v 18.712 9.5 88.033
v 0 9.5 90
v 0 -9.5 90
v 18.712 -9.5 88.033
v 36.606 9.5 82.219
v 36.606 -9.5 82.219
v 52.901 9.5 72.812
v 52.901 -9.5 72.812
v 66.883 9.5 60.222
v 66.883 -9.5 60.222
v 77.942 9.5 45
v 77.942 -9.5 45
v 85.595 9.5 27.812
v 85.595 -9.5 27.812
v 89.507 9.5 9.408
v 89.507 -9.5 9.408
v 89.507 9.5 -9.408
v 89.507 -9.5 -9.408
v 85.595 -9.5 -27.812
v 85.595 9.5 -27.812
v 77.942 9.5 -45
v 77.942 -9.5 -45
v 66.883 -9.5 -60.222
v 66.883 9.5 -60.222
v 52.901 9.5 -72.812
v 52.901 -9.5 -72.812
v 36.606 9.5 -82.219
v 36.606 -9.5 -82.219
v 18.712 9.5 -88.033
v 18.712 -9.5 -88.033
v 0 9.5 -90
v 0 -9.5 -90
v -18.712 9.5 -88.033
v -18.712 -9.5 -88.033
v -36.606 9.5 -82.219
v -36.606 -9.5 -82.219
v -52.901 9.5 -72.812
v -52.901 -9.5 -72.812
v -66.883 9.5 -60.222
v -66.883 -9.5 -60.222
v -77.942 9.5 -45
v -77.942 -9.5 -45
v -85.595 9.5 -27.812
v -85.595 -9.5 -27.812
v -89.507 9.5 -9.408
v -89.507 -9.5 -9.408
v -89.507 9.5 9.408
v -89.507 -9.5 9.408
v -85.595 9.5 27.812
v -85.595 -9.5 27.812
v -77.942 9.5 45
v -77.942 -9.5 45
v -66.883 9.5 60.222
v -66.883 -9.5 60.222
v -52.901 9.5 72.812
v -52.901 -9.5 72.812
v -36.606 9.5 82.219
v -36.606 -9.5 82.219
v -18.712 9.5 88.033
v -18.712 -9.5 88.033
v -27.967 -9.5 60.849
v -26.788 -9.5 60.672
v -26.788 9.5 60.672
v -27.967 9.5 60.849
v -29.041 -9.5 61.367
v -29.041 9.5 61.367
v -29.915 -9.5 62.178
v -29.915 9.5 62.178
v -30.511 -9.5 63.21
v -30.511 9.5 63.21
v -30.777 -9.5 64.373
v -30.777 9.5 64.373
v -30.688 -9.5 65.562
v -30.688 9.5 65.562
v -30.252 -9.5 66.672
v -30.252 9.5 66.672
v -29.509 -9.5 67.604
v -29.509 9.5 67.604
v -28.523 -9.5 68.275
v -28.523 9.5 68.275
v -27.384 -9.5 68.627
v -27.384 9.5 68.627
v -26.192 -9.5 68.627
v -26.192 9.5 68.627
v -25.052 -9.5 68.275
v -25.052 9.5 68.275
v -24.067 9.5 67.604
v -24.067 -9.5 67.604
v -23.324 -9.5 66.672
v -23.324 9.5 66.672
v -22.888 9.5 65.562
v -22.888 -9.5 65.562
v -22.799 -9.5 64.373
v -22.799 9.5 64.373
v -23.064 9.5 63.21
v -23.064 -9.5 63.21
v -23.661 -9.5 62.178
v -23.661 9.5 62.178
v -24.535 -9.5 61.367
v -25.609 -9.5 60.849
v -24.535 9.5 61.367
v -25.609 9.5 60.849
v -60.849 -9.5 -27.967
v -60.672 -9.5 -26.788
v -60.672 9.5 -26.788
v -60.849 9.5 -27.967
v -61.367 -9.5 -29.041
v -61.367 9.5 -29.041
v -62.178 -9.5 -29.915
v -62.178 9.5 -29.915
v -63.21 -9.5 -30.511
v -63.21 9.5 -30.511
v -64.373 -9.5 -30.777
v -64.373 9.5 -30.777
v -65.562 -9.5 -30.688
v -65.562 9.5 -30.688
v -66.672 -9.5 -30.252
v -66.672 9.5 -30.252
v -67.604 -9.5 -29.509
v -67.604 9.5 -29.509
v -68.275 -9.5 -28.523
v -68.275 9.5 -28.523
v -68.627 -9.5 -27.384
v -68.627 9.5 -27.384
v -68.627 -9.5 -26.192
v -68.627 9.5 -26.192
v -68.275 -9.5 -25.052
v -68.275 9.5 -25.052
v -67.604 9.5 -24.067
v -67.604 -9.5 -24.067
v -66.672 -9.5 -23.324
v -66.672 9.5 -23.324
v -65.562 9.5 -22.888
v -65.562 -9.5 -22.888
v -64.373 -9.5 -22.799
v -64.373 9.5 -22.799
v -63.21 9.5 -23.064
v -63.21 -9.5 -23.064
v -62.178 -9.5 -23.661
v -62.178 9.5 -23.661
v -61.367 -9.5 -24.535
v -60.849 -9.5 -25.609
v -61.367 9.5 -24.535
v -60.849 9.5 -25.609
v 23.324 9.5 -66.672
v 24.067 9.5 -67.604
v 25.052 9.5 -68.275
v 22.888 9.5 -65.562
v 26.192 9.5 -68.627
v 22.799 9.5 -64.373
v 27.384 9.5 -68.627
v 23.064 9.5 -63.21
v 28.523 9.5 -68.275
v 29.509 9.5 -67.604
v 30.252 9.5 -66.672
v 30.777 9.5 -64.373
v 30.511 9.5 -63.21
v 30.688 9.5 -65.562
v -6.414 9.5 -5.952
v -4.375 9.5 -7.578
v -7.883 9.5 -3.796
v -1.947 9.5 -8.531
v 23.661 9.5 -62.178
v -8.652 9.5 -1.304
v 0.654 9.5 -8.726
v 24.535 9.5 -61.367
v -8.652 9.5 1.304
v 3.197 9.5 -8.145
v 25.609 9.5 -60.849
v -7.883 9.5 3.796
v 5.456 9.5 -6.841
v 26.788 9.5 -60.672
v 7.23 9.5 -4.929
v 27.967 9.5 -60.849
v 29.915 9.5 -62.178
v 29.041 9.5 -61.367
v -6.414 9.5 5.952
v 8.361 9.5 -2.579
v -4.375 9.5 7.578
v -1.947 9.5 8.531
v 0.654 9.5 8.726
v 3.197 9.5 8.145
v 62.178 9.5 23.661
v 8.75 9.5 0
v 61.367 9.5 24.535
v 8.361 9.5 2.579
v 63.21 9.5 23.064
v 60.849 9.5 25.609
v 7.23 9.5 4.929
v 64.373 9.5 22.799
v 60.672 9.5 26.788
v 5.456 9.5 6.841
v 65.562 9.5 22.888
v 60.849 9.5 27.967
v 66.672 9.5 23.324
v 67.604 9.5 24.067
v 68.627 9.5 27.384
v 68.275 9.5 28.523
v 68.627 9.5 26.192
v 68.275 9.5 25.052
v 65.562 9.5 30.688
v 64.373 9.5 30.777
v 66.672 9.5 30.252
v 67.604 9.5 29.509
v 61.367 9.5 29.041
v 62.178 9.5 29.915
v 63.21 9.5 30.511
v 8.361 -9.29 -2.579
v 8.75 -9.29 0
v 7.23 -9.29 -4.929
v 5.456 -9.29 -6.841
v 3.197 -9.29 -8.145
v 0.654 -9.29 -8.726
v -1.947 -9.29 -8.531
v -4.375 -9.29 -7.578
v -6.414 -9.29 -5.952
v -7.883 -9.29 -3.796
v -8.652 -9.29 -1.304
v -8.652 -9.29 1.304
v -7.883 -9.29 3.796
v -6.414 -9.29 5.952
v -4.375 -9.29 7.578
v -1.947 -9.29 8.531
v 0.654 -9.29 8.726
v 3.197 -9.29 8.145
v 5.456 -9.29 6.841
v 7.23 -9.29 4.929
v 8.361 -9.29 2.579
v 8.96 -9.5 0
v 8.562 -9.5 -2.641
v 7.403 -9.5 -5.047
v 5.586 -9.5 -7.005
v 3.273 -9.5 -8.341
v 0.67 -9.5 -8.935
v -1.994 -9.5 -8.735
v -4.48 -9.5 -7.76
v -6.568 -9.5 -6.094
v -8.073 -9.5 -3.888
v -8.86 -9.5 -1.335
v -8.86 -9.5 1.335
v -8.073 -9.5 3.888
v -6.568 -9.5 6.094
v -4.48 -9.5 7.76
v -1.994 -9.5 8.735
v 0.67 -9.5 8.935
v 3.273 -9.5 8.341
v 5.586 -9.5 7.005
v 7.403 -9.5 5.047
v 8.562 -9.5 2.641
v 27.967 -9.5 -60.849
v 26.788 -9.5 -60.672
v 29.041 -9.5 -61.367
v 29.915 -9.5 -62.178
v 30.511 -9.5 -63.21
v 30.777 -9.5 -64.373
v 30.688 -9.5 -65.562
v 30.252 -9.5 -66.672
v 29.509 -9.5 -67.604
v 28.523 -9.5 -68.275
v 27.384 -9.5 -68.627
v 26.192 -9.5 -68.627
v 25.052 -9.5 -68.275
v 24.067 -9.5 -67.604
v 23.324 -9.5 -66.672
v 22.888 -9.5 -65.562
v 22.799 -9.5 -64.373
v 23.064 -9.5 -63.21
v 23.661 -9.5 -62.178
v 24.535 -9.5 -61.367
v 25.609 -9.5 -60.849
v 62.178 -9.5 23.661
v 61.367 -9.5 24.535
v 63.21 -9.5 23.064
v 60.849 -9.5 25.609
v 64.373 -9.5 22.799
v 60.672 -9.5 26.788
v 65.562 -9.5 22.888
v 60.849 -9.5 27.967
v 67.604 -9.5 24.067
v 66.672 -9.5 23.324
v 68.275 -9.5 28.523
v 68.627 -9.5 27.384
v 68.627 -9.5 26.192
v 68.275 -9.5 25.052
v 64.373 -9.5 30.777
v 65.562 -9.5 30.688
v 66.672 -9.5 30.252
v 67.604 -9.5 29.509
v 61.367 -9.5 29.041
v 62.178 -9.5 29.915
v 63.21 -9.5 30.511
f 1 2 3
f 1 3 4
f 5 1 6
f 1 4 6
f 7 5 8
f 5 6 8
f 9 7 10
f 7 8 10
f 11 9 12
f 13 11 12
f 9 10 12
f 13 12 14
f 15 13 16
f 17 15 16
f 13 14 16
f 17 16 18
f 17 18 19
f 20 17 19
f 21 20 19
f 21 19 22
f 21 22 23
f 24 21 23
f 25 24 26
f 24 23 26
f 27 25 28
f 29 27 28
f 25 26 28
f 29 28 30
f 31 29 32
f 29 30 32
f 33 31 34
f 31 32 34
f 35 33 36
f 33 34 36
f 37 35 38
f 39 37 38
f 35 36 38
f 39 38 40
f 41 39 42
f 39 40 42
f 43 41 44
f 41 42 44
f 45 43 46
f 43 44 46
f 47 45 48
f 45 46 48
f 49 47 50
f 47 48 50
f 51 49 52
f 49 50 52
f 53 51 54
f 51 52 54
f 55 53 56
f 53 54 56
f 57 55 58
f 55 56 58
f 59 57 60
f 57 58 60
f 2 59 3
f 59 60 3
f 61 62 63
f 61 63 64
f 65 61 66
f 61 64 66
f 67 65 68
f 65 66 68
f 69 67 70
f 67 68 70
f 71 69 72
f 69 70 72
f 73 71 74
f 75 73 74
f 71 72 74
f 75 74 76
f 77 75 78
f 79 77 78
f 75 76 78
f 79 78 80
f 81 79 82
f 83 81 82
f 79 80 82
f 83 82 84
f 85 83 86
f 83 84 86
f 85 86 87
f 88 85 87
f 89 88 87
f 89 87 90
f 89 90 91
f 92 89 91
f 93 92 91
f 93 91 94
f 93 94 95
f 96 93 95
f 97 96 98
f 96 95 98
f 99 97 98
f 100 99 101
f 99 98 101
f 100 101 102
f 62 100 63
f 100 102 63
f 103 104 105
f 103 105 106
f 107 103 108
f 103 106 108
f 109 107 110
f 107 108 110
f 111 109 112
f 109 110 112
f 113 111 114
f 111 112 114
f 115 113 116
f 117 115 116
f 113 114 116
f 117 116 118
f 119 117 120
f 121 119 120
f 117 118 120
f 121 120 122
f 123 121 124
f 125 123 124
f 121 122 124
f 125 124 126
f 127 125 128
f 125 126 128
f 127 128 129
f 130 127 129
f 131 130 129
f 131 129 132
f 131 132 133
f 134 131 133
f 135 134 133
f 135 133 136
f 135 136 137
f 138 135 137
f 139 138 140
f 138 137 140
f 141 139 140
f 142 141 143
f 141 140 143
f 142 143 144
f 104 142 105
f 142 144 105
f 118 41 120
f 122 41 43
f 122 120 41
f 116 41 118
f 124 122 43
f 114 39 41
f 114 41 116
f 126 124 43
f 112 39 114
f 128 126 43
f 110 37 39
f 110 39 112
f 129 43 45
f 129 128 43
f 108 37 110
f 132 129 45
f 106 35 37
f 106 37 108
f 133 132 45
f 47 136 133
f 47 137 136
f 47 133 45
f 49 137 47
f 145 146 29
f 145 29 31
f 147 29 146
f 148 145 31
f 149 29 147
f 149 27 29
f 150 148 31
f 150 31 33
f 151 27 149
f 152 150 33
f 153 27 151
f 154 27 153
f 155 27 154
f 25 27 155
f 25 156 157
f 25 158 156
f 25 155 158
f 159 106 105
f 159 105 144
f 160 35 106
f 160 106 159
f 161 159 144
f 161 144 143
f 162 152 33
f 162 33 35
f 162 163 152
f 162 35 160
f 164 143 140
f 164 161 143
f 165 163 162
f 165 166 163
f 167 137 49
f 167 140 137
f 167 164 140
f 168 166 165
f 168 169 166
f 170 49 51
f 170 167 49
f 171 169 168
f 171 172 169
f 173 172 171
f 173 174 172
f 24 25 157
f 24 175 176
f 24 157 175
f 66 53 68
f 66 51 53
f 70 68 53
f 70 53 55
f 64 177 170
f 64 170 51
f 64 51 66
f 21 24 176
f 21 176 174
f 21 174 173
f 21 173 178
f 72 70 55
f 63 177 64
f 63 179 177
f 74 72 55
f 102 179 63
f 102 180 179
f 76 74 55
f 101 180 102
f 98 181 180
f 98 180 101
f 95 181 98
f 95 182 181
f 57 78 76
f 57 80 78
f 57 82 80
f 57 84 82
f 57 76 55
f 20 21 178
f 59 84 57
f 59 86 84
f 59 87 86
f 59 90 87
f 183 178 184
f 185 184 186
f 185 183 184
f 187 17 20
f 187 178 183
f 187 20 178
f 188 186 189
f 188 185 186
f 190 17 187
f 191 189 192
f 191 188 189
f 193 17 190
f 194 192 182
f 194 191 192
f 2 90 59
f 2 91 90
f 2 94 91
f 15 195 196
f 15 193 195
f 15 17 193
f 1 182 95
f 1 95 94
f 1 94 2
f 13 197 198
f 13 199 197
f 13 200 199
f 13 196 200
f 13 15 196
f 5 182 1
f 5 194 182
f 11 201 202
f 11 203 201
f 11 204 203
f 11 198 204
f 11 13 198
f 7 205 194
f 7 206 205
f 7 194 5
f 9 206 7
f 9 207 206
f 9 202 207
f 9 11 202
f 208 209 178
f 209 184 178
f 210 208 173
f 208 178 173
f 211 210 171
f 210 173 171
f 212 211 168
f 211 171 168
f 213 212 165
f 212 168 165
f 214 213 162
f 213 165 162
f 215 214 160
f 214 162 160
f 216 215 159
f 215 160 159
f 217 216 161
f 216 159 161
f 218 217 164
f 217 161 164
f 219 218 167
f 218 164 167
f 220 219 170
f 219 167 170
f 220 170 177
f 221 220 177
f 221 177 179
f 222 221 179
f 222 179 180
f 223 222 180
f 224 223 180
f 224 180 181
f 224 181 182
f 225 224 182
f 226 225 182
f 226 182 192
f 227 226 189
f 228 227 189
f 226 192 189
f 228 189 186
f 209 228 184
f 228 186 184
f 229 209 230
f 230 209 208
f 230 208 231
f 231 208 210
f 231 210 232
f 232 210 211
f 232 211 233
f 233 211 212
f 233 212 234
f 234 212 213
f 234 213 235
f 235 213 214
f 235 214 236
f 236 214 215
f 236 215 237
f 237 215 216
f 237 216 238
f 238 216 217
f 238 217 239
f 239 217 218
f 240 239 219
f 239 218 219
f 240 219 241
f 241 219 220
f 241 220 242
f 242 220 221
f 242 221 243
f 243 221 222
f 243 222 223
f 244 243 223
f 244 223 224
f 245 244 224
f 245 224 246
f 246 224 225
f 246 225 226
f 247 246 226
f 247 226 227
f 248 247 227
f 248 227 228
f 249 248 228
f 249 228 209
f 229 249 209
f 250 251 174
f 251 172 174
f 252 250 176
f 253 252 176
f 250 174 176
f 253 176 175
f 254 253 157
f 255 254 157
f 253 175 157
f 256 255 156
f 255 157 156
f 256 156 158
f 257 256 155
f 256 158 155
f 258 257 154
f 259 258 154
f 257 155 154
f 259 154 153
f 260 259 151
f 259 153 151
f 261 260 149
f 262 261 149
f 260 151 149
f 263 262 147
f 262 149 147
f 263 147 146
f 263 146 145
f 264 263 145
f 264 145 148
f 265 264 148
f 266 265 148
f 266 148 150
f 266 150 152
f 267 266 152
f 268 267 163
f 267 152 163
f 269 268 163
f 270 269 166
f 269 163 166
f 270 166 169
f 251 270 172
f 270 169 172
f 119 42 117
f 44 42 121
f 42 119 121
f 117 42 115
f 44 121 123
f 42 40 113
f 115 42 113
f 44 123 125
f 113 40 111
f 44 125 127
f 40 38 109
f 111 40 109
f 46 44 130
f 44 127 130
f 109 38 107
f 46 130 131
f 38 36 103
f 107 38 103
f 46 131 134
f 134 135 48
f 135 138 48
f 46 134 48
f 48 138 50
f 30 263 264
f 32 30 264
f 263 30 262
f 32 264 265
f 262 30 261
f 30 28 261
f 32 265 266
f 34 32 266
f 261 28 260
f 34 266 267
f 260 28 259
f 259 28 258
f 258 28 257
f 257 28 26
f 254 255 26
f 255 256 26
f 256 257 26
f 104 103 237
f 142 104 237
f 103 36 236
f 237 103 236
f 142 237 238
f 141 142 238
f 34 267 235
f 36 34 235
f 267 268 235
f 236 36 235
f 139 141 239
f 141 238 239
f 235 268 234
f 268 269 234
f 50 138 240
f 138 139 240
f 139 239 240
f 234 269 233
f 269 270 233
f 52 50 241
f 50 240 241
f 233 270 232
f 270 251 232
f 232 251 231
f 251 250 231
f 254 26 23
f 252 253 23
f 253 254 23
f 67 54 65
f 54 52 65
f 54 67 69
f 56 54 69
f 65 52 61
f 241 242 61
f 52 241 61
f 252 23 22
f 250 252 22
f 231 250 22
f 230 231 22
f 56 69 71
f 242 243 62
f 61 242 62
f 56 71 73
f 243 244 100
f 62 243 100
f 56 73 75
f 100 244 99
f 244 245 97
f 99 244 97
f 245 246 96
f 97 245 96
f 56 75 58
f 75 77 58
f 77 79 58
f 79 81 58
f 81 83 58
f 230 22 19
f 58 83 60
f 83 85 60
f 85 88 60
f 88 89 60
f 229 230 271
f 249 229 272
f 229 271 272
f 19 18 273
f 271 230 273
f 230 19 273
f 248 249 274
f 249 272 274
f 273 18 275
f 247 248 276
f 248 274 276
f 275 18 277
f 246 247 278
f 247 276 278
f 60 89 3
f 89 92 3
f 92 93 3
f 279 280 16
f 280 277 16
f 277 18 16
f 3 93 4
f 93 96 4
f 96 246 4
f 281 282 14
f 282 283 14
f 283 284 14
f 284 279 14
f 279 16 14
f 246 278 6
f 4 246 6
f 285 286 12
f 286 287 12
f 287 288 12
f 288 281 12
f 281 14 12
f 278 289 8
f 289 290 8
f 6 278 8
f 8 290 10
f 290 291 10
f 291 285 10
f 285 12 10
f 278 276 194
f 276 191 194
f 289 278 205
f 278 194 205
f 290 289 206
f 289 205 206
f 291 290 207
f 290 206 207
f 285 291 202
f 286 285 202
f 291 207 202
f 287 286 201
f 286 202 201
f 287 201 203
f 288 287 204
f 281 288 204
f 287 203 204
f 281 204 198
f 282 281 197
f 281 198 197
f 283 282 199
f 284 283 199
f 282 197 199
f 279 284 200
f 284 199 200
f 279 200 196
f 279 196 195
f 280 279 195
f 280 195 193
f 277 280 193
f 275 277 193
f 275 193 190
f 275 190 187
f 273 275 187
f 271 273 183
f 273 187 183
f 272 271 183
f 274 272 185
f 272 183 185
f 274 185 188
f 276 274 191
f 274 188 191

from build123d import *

# Parameters (mm, degrees)
BOSS_EXTRUDE1_DEPTH           = 9.5
BOSS_EXTRUDE1_DEPTH_BACK      = 9.5
SKETCH1_R                     = 90
CSK_FOR_M8_SFHCS2_D           = 17.5
CSK_FOR_M8_SFHCS2_CSINK_D     = 17.92
CSK_FOR_M8_SFHCS2_CSINK_ANGLE = 90
SKETCH8_R                     = 4
CUT_EXTRUDE3_DEPTH            = 128.633263689
CIRPATTERN2_COUNT             = 4


with BuildPart() as part:
    # Sketch1 → Boss-Extrude1 (new, two sides: drawn at the far end of the back side and taken through both)
    with BuildSketch(Plane(origin=(0, 0, 0), x_dir=(1, 0, 0), z_dir=(0, 1, 0)).offset(-BOSS_EXTRUDE1_DEPTH_BACK)):
        Circle(SKETCH1_R)
    extrude(amount=BOSS_EXTRUDE1_DEPTH + BOSS_EXTRUDE1_DEPTH_BACK)

    # CSK for M8 SFHCS2 (through all)
    with Locations(Plane(origin=(0, -9.5, 0), x_dir=(-1, 0, 0), z_dir=(0, -1, 0))):
        with Locations((0, 0)):
            CounterSinkHole(CSK_FOR_M8_SFHCS2_D / 2, CSK_FOR_M8_SFHCS2_CSINK_D / 2, counter_sink_angle=CSK_FOR_M8_SFHCS2_CSINK_ANGLE)

    # Sketch8 → Cut-Extrude3 (cut, symmetric)
    with BuildSketch(Plane(origin=(0, 0, 0), x_dir=(1, 0, 0), z_dir=(0, 1, 0))):
        with Locations((26.787840266, 64.671567276)):
            Circle(SKETCH8_R)
    cut_extrude3 = extrude(amount=CUT_EXTRUDE3_DEPTH, both=True, mode=Mode.SUBTRACT)

    # CirPattern2: Cut-Extrude3 ×4 about axis
    cirpattern2_axis = Axis((0, 9.5, 0), (0, -1, 0))
    for i in range(1, CIRPATTERN2_COUNT):
        add(cut_extrude3.rotate(cirpattern2_axis, i * 360 / CIRPATTERN2_COUNT), mode=Mode.SUBTRACT)


solid = part.part
